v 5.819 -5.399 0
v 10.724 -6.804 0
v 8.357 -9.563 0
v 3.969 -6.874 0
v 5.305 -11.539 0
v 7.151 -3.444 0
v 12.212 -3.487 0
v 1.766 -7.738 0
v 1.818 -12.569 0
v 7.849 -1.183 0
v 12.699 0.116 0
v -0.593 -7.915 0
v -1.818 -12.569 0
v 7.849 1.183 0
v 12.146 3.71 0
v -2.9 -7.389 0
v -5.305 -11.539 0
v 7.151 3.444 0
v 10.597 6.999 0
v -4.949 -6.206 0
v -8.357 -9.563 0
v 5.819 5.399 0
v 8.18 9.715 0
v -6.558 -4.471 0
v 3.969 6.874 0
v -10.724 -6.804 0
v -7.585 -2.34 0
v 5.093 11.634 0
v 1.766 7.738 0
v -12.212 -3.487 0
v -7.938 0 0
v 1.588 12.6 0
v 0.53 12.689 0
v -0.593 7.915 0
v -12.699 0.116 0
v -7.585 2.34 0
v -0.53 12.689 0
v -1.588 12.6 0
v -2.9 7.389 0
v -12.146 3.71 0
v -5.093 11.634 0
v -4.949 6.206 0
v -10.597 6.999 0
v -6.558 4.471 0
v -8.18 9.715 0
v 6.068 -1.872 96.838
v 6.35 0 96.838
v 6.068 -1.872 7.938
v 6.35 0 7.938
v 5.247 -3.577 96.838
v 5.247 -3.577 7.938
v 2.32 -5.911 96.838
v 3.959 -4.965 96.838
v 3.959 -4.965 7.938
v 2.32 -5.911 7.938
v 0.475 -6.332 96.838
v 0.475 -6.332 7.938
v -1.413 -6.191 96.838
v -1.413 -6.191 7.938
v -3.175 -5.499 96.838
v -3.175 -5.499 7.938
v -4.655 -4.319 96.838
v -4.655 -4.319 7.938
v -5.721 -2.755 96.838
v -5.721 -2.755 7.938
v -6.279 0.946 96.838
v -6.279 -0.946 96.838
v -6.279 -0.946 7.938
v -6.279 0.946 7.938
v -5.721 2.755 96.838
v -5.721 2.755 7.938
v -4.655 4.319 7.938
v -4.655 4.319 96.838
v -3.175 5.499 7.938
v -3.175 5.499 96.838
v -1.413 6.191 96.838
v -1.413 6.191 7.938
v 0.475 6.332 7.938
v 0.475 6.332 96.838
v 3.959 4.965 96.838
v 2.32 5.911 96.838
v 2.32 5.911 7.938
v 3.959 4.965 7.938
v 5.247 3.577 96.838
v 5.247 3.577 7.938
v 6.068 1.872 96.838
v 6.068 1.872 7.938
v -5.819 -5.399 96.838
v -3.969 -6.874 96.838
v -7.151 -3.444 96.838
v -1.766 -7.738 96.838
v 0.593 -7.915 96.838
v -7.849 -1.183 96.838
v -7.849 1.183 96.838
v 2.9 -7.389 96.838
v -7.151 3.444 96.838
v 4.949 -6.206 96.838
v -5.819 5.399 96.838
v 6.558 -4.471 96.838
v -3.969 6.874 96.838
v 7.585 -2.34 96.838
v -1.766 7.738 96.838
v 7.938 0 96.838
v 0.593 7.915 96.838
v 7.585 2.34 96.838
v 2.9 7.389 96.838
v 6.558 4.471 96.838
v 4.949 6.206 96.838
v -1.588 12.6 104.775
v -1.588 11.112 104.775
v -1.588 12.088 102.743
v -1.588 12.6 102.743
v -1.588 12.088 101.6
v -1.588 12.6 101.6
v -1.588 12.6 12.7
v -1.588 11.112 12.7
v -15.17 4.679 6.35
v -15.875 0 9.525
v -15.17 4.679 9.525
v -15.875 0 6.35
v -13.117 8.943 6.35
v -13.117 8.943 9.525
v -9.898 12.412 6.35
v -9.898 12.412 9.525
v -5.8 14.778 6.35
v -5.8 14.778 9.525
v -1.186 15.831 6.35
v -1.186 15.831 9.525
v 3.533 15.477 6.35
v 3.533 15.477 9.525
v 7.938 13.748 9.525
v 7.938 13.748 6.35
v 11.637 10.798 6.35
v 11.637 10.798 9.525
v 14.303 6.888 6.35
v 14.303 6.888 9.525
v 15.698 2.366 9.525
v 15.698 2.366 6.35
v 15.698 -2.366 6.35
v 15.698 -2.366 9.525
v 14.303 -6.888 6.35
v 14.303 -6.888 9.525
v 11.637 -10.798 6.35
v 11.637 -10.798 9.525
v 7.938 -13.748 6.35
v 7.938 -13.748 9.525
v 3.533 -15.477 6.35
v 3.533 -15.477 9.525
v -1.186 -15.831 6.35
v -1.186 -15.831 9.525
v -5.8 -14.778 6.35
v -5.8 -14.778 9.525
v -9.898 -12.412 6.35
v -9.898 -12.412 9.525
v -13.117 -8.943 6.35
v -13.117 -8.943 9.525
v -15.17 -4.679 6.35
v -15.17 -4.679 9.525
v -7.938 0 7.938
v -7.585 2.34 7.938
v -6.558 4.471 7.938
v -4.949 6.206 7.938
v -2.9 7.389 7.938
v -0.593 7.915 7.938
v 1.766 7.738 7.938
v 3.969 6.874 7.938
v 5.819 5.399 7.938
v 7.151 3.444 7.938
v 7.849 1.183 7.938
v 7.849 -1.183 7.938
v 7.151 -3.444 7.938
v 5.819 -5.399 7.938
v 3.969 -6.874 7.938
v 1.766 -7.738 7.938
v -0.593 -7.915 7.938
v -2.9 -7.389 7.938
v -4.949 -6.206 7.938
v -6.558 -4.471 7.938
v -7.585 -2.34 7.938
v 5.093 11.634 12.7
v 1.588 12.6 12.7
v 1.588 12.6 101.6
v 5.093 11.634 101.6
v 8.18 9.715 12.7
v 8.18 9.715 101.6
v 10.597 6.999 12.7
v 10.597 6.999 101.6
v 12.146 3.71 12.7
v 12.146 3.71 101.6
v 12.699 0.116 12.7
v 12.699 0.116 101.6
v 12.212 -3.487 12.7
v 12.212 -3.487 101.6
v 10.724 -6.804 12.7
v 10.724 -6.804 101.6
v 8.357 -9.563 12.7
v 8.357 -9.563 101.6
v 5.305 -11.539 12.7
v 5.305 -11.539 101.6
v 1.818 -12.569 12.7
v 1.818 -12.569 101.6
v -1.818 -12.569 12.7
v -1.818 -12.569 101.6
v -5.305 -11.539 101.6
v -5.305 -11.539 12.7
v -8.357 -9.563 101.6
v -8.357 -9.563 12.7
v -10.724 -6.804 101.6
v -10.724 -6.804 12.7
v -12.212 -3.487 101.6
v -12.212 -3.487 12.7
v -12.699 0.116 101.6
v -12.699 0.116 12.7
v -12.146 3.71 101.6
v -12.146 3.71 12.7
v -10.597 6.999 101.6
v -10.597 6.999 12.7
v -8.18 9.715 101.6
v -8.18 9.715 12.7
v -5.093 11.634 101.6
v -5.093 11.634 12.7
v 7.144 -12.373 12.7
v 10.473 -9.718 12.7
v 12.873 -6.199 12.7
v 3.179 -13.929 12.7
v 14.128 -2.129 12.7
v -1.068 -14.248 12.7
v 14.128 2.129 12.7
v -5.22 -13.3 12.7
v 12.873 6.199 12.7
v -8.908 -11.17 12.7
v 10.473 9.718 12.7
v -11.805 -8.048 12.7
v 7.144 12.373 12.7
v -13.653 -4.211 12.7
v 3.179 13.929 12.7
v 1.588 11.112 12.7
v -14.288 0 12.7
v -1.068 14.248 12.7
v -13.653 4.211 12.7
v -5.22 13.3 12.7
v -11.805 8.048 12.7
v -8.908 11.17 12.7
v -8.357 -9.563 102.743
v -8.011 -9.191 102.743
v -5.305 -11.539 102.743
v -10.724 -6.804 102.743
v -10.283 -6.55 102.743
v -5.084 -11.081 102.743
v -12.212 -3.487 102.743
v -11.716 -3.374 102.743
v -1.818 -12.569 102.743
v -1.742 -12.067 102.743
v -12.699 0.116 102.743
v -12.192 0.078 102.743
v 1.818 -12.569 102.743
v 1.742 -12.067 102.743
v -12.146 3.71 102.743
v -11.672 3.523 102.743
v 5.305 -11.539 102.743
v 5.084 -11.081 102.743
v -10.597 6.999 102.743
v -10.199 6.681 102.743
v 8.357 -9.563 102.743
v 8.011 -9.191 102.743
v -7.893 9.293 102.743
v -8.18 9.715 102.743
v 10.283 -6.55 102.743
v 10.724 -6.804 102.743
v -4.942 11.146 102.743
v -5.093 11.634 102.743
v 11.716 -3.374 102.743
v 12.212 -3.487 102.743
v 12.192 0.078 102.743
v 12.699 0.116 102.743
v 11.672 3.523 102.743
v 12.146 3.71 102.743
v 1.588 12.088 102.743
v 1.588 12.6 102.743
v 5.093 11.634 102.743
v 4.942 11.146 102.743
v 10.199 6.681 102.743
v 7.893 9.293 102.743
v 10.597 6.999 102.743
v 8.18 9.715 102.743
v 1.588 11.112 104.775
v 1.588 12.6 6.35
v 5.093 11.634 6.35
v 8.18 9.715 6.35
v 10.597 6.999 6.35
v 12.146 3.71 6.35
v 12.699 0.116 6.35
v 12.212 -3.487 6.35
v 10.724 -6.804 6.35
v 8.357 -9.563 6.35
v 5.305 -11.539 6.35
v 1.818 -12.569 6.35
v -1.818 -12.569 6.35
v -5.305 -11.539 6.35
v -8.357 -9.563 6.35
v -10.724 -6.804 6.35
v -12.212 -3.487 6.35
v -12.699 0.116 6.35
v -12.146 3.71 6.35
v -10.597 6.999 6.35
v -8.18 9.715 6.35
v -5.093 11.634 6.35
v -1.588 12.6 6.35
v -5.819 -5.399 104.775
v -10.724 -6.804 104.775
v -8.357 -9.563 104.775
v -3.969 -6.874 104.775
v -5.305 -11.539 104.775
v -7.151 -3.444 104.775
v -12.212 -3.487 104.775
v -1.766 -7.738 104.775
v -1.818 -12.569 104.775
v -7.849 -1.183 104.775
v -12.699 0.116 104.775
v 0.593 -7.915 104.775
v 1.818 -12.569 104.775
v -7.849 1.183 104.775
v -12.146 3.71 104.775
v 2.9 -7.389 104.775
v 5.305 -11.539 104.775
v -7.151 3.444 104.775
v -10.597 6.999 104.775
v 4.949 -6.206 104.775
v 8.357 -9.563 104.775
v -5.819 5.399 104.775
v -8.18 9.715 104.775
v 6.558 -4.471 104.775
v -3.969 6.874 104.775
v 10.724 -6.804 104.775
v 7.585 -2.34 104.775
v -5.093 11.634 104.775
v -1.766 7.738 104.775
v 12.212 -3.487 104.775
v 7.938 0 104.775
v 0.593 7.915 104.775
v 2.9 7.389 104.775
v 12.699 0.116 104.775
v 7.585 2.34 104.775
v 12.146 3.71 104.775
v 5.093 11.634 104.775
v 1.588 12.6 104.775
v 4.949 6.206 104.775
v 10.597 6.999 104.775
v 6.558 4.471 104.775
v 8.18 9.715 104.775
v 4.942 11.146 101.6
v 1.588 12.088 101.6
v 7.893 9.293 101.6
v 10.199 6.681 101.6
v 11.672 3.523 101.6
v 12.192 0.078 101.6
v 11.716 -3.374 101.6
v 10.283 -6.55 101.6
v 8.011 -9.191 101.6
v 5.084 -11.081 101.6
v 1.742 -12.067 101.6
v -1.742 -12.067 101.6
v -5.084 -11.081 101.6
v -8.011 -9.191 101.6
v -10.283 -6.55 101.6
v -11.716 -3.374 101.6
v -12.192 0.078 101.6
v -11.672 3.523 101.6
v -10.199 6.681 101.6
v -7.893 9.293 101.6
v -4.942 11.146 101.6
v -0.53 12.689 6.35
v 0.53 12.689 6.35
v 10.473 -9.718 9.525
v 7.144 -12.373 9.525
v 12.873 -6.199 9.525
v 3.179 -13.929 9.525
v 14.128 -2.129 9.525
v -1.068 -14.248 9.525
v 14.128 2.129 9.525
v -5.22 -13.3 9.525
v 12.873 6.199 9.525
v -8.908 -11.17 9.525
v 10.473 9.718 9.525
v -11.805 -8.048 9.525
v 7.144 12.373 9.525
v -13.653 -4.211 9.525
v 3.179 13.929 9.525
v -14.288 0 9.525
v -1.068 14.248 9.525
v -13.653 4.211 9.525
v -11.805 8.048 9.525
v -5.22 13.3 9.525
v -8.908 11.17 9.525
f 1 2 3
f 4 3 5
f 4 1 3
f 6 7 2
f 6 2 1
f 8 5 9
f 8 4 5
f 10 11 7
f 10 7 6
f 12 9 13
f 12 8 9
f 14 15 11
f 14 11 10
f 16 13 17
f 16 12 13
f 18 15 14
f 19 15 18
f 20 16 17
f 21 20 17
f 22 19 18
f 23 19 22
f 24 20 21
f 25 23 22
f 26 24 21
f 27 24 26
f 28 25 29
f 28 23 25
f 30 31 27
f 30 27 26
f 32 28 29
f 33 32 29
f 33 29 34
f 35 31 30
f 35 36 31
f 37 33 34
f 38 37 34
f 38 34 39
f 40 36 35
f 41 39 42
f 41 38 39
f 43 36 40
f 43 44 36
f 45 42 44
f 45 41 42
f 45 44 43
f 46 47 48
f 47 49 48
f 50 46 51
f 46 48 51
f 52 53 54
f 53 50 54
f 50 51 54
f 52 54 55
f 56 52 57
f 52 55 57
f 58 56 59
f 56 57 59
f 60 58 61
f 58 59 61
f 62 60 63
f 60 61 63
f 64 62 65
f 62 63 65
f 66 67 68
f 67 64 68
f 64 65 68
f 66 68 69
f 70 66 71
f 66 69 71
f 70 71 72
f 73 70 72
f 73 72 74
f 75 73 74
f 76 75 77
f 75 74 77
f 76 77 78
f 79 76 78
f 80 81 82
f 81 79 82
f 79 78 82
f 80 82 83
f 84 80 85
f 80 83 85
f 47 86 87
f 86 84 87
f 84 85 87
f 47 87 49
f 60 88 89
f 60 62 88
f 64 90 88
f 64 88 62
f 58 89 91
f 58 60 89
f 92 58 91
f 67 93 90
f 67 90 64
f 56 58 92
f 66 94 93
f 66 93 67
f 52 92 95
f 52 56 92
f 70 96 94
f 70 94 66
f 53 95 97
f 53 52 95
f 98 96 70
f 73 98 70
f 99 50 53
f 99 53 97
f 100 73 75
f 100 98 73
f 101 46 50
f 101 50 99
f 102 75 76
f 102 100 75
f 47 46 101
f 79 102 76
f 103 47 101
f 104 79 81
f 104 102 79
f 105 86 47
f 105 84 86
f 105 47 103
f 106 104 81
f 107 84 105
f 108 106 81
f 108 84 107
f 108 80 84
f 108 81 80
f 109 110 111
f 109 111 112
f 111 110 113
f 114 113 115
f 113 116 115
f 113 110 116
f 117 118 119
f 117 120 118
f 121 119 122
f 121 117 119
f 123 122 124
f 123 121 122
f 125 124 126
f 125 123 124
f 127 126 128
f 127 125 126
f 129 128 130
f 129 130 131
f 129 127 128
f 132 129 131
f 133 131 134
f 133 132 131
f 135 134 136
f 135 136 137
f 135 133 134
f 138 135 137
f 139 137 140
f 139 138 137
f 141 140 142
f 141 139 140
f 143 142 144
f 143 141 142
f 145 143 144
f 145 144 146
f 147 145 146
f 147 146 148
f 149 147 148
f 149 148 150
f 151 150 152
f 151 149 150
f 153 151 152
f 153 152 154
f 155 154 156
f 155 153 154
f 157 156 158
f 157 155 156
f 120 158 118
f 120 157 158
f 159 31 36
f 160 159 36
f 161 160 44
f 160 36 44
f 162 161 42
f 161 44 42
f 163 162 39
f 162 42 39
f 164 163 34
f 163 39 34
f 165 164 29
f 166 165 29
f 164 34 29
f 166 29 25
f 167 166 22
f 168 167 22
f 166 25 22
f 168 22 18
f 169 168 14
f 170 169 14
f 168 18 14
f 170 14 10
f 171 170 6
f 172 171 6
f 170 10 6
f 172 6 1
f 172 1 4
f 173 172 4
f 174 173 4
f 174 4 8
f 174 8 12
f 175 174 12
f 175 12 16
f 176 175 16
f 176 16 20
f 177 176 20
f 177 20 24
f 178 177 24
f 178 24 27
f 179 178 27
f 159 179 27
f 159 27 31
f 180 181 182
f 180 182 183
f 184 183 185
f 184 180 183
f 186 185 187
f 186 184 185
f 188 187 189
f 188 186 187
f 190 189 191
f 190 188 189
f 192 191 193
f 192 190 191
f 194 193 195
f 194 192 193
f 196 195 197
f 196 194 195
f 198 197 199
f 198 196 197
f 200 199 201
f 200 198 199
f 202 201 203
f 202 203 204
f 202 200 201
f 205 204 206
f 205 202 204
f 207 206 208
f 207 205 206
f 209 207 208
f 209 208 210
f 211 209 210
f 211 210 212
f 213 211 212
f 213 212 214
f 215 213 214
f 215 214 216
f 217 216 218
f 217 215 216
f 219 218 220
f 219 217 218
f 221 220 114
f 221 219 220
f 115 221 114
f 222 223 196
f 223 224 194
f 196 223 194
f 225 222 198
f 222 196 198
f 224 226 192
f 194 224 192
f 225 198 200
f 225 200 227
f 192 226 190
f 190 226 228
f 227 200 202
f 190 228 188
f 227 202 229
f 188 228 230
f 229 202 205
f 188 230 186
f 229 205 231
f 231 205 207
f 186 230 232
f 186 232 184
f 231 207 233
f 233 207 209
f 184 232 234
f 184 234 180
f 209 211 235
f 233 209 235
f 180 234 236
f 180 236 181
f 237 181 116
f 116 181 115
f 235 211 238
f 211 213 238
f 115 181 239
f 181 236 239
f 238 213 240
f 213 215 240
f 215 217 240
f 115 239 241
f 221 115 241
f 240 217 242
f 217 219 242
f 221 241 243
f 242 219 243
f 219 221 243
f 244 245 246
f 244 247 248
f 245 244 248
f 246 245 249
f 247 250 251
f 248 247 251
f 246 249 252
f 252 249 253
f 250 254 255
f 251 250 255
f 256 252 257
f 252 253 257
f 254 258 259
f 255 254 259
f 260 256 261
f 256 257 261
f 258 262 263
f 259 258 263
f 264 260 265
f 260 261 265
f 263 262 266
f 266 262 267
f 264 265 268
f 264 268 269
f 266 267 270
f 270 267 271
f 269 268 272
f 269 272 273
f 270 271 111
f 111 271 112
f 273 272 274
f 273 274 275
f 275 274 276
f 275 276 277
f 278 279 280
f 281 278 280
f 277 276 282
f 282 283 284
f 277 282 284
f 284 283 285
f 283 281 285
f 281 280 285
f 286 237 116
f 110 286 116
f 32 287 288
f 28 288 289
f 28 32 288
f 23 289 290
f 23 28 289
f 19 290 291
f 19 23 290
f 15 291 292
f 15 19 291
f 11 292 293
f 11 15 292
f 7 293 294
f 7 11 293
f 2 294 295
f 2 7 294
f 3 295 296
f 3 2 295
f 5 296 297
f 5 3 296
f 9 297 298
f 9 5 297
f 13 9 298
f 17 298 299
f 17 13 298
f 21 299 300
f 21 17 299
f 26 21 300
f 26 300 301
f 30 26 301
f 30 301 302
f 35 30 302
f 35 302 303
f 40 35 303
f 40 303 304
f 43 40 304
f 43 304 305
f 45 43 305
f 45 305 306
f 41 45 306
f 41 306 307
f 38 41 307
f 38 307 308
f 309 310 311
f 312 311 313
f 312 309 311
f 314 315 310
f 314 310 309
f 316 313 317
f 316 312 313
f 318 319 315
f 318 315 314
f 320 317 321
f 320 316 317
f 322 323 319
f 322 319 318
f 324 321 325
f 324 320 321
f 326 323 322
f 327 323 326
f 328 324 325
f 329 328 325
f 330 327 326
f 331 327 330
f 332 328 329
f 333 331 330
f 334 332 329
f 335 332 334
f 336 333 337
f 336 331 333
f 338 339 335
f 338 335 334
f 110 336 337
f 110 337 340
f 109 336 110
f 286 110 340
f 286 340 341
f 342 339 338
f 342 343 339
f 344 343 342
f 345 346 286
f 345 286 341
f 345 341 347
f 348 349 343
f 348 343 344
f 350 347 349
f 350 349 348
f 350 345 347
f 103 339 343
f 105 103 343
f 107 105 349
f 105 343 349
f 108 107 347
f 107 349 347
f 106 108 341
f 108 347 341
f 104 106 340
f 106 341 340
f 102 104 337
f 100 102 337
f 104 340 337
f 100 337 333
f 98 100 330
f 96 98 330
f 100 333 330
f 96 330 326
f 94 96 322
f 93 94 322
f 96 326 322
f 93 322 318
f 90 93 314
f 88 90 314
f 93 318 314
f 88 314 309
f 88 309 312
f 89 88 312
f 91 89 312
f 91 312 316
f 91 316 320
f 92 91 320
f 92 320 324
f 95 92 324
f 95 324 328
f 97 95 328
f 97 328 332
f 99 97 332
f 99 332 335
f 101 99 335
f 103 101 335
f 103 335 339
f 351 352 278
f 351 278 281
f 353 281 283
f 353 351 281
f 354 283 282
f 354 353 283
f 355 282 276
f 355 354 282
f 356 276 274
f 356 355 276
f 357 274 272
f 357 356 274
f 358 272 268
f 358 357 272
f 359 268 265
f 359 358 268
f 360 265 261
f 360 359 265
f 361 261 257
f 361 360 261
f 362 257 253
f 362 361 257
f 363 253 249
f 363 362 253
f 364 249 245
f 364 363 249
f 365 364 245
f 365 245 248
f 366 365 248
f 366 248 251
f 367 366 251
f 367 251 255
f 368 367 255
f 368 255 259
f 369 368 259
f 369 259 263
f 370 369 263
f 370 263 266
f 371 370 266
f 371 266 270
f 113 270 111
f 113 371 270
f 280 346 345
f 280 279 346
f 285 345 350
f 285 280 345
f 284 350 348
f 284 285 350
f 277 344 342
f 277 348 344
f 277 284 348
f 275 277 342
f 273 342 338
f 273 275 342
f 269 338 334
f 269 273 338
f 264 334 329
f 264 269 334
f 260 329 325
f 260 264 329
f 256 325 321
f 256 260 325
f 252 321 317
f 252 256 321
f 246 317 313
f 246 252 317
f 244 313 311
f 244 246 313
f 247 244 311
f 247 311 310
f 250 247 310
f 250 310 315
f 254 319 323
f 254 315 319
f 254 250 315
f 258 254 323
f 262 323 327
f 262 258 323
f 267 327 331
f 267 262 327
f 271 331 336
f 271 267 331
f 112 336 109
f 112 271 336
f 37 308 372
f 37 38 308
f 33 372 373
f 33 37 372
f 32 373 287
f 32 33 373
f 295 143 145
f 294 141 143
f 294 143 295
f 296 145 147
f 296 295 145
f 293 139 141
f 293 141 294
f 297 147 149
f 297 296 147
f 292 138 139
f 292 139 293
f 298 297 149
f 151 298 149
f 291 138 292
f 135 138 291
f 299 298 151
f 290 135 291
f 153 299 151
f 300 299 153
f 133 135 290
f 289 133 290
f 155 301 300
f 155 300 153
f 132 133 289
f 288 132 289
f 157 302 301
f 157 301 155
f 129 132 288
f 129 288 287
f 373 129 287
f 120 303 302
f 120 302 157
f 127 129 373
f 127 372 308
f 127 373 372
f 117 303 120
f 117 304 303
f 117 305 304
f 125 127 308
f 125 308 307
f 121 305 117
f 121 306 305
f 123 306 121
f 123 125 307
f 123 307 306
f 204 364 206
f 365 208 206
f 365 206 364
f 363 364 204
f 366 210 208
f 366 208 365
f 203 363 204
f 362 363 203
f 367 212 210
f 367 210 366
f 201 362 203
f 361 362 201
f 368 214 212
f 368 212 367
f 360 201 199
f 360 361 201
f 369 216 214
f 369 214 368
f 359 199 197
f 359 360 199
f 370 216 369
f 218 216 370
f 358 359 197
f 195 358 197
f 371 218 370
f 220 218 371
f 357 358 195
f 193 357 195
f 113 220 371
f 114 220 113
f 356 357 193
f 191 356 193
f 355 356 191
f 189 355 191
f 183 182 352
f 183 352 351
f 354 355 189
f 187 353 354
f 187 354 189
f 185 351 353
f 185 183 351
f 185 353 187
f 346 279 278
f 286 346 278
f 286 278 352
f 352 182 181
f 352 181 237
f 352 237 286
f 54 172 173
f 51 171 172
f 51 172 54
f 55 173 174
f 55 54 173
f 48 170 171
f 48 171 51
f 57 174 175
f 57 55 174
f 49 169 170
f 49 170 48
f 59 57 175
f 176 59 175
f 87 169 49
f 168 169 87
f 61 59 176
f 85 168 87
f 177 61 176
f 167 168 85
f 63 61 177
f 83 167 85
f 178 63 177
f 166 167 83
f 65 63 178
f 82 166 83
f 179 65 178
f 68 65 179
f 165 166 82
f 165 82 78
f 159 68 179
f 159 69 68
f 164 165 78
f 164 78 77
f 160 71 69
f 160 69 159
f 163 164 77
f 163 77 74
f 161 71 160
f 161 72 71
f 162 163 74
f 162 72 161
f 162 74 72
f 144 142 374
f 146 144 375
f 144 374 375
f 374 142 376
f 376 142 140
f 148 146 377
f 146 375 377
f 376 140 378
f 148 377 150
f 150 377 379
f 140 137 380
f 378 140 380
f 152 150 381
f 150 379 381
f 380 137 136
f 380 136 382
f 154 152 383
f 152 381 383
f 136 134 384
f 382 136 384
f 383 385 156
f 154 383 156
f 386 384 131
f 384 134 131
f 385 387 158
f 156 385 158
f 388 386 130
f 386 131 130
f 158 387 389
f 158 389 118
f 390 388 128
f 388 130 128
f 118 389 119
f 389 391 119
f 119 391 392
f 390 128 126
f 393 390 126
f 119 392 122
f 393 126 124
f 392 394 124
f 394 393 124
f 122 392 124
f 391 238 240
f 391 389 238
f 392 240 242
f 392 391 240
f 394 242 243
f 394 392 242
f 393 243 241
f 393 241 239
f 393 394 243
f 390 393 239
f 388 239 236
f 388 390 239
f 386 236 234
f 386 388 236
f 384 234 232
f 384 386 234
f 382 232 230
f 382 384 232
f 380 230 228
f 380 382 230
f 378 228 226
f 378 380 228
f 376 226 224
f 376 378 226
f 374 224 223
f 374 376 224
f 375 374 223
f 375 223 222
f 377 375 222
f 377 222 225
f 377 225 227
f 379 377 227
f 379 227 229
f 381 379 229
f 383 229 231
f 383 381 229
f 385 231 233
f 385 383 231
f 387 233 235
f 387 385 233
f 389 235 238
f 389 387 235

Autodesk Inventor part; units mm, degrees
sketch "Sketch1" plane through (0, 0, 0) normal (0, 0, 1) x (1, 0, 0)
  circle A0 centre (0, 0) radius 12.7
  circle A1 centre (0, 0) radius 6.35
  line L0 (-1.5875, 14.2875) -> (1.5875, 14.2875)
  line L1 (1.5875, 14.2875) -> (1.5875, 11.1125)
  line L2 (1.5875, 11.1125) -> (-1.5875, 11.1125)
  line L3 (-1.5875, 11.1125) -> (-1.5875, 14.2875)
  dimension "d0" = 25.4
  dimension "d4" = 12.7
  dimension "d50" = 3.175
  dimension "d51" = 3.175
  dimension "d52" = 1.5875
  dimension "d53" = 14.2875
extrude "Extrusion4" add sketch "Sketch1" along normal blind 104.775 contours A0 L3 L2 L1 | L1 L2 L3 A0
ref_plane "Work Plane5" through (0, 0, 101.6) normal (0, 0, 1) x (1, 0, 0)
sketch "Sketch6" plane through (0, 0, 101.6) normal (0, 0, 1) x (1, 0, 0)
  circle A0 centre (0, 0) radius 12.192
  circle A1 centre (0, 0) radius 12.7 projected
  dimension "d24" = 24.384
extrude "Extrusion8" cut sketch "Sketch6" along normal blind 1.143
ref_plane "Work Plane6" through (0, 0, 15.113) normal (0, 0, -1) x (-1, 0, 0)
ref_plane "Work Plane9" through (0, 0, 43.3324) normal (0, 0, -1) x (-1, 0, 0)
ref_plane "Work Plane10" through (0, 0, 29.464) normal (0, 0, -1) x (-1, 0, 0)
extrude "Extrusion16" cut sketch "Sketch1" along normal through all contours L1 L2 L3 A0 | A0 L3 L0 L1 picked at (0.1768, 11.638)
sketch "Sketch14" plane through (0, 0, 104.775) normal (0, 0, 1) x (1, 0, 0)
  circle A0 centre (0, 0) radius 6.35 projected
  circle A1 centre (0, 0) radius 7.9375
  dimension "d56" = 15.875
extrude "Extrusion17" cut sketch "Sketch14" against normal blind 7.9375
sketch "Sketch15" plane through (0, 0, 0) normal (0, 0, -1) x (-1, 0, 0)
  circle A0 centre (0, 0) radius 6.35 projected
  circle A1 centre (0, 0) radius 7.9375
  dimension "d59" = 15.875
extrude "Extrusion18" cut sketch "Sketch15" against normal blind 7.9375
ref_plane "Work Plane13" through (0, 0, 6.35) normal (0, 0, -1) x (-1, 0, 0)
sketch "Sketch16" plane through (0, 0, 6.35) normal (0, 0, -1) x (-1, 0, 0)
  arc A0 (-1.5875, 12.6004) -> (1.5875, 12.6004) centre (0, 0) ccw projected
  line L0 (-1.5875, 12.6004) -> (-1.5875, 11.1125) projected
  line L1 (-1.5875, 11.1125) -> (1.5875, 11.1125) projected
  line L2 (1.5875, 11.1125) -> (1.5875, 12.6004) projected
  circle A1 centre (0, 0) radius 15.875
  circle A2 centre (0, 0) radius 14.2875
  dimension "d63" = 31.75
  dimension "d68" = 28.575
extrude "Extrusion19" add sketch "Sketch16" against normal blind 3.175 contours A1 | A2
sketch "Sketch17" plane through (0, 0, 0) normal (0, 0, -1) x (-1, 0, 0)
  line L0 (-1.5875, 11.1125) -> (-1.5875, 12.6004) projected
  arc A0 (-1.5875, 12.6004) -> (1.5875, 12.6004) centre (0, 0) ccw projected
  line L1 (1.5875, 12.6004) -> (1.5875, 11.1125) projected
  line L2 (1.5875, 11.1125) -> (-1.5875, 11.1125) projected
  arc A1 (1.5875, 12.6004) -> (-1.5875, 12.6004) centre (0, 0) ccw
extrude "Extrusion20" add sketch "Sketch17" against normal blind 6.35 contours L0 A1 L1 L2
extrude "Extrusion21" add sketch "Sketch16" against normal blind 6.35 contours A2
equation "\"d51\" = d50"
equation "\"d52\" = 0.5 * d50"
equation "\"d53\" = 0.5 * d0 + 0.5 * d50"
properties part number "turn shaft 2"
